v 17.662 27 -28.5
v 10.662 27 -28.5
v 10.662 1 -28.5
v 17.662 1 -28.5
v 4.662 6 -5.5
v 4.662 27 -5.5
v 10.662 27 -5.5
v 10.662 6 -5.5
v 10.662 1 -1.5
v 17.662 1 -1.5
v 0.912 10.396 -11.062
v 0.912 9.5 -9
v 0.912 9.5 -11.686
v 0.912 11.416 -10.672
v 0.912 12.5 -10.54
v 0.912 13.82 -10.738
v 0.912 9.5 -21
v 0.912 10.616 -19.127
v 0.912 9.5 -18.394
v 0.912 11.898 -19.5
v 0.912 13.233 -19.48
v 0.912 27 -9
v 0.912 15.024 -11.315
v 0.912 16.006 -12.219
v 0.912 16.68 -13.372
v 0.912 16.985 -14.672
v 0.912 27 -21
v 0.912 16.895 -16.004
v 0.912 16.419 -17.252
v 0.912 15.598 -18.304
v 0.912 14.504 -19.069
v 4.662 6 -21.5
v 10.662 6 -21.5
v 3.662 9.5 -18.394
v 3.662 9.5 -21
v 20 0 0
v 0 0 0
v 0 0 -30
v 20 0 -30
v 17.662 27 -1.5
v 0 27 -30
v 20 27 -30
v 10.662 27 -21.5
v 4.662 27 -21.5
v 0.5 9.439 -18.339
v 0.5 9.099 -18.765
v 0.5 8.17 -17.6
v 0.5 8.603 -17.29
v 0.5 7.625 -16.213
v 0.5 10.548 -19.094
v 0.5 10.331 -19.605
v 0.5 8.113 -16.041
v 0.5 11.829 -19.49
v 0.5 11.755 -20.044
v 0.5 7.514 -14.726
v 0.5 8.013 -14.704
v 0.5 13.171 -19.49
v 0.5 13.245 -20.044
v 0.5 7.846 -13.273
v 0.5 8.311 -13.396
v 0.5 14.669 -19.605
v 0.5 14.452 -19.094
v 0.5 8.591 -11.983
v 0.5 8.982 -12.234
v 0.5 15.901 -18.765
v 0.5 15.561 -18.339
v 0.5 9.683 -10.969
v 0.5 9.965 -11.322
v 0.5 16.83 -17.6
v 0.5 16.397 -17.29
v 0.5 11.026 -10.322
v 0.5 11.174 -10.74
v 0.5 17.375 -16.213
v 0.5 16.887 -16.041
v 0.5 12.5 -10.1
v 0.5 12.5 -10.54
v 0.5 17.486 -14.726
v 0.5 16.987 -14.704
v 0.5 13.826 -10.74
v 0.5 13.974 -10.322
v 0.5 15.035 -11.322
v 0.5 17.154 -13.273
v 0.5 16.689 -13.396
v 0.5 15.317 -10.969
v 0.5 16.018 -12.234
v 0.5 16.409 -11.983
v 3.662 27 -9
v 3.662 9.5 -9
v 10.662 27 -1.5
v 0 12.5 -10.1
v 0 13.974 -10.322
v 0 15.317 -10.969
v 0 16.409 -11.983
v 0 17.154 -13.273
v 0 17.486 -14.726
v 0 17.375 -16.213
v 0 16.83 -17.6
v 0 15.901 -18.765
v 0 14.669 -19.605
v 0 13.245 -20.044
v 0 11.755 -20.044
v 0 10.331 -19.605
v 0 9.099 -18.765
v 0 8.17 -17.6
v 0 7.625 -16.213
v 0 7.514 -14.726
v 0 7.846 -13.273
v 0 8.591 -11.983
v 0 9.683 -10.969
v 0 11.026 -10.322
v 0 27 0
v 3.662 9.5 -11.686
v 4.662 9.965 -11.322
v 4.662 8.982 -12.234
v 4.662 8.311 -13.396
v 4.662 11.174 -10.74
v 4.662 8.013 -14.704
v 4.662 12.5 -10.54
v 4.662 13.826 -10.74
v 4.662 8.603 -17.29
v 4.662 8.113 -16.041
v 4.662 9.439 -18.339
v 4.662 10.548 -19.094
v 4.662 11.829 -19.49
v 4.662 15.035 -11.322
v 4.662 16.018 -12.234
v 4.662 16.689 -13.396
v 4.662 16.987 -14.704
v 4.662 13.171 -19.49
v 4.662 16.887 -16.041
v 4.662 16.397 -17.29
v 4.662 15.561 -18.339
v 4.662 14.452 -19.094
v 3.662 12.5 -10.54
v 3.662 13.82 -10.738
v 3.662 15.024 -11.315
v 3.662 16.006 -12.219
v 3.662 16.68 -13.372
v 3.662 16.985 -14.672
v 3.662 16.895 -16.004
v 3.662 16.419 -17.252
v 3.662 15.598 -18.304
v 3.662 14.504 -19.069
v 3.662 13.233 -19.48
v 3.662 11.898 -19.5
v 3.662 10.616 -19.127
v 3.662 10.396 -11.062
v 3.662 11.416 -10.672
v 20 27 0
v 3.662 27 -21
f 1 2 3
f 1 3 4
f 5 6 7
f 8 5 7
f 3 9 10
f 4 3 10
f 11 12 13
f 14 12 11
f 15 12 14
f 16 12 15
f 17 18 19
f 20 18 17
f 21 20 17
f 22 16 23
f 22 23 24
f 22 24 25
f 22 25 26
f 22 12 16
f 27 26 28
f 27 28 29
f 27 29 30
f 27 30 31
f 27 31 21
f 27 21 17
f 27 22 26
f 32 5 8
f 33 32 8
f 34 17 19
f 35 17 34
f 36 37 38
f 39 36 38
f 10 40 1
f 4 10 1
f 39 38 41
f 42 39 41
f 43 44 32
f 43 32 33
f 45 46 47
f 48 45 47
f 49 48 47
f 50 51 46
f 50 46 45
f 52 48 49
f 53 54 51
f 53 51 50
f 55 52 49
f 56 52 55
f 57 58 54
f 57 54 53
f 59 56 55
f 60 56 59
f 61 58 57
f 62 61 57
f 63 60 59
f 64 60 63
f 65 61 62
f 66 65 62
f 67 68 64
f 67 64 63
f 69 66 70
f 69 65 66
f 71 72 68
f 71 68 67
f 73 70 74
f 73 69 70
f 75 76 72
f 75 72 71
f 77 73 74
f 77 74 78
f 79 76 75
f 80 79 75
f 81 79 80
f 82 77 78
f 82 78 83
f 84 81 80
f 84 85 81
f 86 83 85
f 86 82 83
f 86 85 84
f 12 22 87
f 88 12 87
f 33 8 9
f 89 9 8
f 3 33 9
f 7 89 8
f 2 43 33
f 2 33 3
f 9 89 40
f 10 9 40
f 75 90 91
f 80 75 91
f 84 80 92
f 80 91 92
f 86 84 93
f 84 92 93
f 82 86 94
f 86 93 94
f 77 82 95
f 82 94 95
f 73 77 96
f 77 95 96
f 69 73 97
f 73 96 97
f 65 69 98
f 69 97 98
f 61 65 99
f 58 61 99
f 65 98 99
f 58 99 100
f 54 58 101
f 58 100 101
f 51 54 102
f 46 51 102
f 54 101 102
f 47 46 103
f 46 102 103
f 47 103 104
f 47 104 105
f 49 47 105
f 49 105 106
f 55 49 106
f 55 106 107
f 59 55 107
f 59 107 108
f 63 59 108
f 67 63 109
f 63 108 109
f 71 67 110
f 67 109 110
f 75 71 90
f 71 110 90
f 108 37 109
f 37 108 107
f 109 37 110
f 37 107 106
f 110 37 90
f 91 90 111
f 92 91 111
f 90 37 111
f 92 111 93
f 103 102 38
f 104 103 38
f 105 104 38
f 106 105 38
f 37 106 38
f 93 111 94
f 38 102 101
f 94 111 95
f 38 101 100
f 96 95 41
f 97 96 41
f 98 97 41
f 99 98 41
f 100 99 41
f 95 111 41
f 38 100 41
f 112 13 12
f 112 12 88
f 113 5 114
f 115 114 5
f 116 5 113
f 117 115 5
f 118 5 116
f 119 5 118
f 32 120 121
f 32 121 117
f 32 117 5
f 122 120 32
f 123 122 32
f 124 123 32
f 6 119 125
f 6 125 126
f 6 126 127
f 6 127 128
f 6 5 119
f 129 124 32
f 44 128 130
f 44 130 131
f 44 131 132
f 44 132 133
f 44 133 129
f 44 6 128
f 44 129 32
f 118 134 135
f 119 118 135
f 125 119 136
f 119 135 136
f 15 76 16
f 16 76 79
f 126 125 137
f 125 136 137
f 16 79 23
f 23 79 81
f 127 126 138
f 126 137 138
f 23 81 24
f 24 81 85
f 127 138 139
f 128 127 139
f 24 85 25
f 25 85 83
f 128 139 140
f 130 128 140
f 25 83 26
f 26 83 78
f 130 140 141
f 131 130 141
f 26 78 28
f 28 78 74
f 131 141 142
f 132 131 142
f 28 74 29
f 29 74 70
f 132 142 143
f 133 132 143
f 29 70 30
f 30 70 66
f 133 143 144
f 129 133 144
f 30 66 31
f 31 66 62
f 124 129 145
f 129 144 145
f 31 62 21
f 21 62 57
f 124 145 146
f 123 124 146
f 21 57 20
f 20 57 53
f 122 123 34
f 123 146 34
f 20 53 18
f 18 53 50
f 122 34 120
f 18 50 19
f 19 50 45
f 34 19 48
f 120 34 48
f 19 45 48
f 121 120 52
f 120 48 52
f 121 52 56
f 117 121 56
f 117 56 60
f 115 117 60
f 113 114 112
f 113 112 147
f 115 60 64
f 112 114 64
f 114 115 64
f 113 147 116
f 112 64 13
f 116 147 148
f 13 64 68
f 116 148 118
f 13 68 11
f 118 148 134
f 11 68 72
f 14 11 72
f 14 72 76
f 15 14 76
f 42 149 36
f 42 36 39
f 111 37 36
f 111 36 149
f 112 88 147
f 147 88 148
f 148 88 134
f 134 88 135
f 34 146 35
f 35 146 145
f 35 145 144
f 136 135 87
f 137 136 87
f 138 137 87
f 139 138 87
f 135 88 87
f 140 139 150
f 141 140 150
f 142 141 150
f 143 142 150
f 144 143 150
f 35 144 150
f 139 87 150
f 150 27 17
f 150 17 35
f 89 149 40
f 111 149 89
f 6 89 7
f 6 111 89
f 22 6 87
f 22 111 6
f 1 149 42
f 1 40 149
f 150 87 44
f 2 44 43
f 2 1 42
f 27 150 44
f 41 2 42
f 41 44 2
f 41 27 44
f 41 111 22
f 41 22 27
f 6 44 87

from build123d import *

# Parameters (mm, degrees)
SKETCH2_W           = 30
SKETCH2_H           = 27
BOSS_EXTRUDE1_DEPTH = 20
SKETCH6_W           = 7
SKETCH6_H           = 27
CUT_EXTRUDE4_DEPTH  = 26
SKETCH9_W           = 6
SKETCH9_H           = 16
CUT_EXTRUDE5_DEPTH  = 21
SKETCH11_R          = 5
CUT_EXTRUDE8_DEPTH  = 0.5
SKETCH12_W          = 2.75
SKETCH12_H          = 12
CUT_EXTRUDE12_DEPTH = 17.5
SKETCH15_R          = 4.5
CUT_EXTRUDE13_DEPTH = 5


with BuildPart() as part:
    # Sketch2 → Boss-Extrude1 (new body)
    with BuildSketch(Plane(origin=(0, 0, 0), x_dir=(0, 0, -1), z_dir=(1, 0, 0))):
        with Locations((15, 13.5)):
            Rectangle(SKETCH2_W, SKETCH2_H)
    extrude(amount=BOSS_EXTRUDE1_DEPTH)

    # Sketch6 → Cut-Extrude4 (cut)
    with BuildSketch(Plane(origin=(2.296116437, 27, -0.293484995), x_dir=(1, 0, 0), z_dir=(0, 1, 0))):
        with Locations((11.865844825, 14.706515005)):
            Rectangle(SKETCH6_W, SKETCH6_H)
    extrude(amount=-CUT_EXTRUDE4_DEPTH, mode=Mode.SUBTRACT)

    # Sketch9 → Cut-Extrude5 (cut)
    with BuildSketch(Plane(origin=(0, 27, 0), x_dir=(1, 0, 0), z_dir=(0, 1, 0))):
        with Locations((7.661961261, 13.5)):
            Rectangle(SKETCH9_W, SKETCH9_H)
    extrude(amount=-CUT_EXTRUDE5_DEPTH, mode=Mode.SUBTRACT)

    # Sketch11 → Cut-Extrude8 (cut)
    with BuildSketch(Plane.ZY):
        with Locations((-15.1, 12.5)):
            Circle(SKETCH11_R)
    extrude(amount=-CUT_EXTRUDE8_DEPTH, mode=Mode.SUBTRACT)

    # Sketch12 → Cut-Extrude12 (cut)
    with BuildSketch(Plane(origin=(0, 27, 0), x_dir=(1, 0, 0), z_dir=(0, 1, 0))):
        with Locations((2.286961261, 15)):
            Rectangle(SKETCH12_W, SKETCH12_H)
    extrude(amount=-CUT_EXTRUDE12_DEPTH, mode=Mode.SUBTRACT)

    # Sketch15 → Cut-Extrude13 (cut)
    with BuildSketch(Plane.ZY.offset(-0.5)):
        with Locations((-15.04, 12.5)):
            Circle(SKETCH15_R)
    extrude(amount=-CUT_EXTRUDE13_DEPTH, mode=Mode.SUBTRACT)


solid = part.part
